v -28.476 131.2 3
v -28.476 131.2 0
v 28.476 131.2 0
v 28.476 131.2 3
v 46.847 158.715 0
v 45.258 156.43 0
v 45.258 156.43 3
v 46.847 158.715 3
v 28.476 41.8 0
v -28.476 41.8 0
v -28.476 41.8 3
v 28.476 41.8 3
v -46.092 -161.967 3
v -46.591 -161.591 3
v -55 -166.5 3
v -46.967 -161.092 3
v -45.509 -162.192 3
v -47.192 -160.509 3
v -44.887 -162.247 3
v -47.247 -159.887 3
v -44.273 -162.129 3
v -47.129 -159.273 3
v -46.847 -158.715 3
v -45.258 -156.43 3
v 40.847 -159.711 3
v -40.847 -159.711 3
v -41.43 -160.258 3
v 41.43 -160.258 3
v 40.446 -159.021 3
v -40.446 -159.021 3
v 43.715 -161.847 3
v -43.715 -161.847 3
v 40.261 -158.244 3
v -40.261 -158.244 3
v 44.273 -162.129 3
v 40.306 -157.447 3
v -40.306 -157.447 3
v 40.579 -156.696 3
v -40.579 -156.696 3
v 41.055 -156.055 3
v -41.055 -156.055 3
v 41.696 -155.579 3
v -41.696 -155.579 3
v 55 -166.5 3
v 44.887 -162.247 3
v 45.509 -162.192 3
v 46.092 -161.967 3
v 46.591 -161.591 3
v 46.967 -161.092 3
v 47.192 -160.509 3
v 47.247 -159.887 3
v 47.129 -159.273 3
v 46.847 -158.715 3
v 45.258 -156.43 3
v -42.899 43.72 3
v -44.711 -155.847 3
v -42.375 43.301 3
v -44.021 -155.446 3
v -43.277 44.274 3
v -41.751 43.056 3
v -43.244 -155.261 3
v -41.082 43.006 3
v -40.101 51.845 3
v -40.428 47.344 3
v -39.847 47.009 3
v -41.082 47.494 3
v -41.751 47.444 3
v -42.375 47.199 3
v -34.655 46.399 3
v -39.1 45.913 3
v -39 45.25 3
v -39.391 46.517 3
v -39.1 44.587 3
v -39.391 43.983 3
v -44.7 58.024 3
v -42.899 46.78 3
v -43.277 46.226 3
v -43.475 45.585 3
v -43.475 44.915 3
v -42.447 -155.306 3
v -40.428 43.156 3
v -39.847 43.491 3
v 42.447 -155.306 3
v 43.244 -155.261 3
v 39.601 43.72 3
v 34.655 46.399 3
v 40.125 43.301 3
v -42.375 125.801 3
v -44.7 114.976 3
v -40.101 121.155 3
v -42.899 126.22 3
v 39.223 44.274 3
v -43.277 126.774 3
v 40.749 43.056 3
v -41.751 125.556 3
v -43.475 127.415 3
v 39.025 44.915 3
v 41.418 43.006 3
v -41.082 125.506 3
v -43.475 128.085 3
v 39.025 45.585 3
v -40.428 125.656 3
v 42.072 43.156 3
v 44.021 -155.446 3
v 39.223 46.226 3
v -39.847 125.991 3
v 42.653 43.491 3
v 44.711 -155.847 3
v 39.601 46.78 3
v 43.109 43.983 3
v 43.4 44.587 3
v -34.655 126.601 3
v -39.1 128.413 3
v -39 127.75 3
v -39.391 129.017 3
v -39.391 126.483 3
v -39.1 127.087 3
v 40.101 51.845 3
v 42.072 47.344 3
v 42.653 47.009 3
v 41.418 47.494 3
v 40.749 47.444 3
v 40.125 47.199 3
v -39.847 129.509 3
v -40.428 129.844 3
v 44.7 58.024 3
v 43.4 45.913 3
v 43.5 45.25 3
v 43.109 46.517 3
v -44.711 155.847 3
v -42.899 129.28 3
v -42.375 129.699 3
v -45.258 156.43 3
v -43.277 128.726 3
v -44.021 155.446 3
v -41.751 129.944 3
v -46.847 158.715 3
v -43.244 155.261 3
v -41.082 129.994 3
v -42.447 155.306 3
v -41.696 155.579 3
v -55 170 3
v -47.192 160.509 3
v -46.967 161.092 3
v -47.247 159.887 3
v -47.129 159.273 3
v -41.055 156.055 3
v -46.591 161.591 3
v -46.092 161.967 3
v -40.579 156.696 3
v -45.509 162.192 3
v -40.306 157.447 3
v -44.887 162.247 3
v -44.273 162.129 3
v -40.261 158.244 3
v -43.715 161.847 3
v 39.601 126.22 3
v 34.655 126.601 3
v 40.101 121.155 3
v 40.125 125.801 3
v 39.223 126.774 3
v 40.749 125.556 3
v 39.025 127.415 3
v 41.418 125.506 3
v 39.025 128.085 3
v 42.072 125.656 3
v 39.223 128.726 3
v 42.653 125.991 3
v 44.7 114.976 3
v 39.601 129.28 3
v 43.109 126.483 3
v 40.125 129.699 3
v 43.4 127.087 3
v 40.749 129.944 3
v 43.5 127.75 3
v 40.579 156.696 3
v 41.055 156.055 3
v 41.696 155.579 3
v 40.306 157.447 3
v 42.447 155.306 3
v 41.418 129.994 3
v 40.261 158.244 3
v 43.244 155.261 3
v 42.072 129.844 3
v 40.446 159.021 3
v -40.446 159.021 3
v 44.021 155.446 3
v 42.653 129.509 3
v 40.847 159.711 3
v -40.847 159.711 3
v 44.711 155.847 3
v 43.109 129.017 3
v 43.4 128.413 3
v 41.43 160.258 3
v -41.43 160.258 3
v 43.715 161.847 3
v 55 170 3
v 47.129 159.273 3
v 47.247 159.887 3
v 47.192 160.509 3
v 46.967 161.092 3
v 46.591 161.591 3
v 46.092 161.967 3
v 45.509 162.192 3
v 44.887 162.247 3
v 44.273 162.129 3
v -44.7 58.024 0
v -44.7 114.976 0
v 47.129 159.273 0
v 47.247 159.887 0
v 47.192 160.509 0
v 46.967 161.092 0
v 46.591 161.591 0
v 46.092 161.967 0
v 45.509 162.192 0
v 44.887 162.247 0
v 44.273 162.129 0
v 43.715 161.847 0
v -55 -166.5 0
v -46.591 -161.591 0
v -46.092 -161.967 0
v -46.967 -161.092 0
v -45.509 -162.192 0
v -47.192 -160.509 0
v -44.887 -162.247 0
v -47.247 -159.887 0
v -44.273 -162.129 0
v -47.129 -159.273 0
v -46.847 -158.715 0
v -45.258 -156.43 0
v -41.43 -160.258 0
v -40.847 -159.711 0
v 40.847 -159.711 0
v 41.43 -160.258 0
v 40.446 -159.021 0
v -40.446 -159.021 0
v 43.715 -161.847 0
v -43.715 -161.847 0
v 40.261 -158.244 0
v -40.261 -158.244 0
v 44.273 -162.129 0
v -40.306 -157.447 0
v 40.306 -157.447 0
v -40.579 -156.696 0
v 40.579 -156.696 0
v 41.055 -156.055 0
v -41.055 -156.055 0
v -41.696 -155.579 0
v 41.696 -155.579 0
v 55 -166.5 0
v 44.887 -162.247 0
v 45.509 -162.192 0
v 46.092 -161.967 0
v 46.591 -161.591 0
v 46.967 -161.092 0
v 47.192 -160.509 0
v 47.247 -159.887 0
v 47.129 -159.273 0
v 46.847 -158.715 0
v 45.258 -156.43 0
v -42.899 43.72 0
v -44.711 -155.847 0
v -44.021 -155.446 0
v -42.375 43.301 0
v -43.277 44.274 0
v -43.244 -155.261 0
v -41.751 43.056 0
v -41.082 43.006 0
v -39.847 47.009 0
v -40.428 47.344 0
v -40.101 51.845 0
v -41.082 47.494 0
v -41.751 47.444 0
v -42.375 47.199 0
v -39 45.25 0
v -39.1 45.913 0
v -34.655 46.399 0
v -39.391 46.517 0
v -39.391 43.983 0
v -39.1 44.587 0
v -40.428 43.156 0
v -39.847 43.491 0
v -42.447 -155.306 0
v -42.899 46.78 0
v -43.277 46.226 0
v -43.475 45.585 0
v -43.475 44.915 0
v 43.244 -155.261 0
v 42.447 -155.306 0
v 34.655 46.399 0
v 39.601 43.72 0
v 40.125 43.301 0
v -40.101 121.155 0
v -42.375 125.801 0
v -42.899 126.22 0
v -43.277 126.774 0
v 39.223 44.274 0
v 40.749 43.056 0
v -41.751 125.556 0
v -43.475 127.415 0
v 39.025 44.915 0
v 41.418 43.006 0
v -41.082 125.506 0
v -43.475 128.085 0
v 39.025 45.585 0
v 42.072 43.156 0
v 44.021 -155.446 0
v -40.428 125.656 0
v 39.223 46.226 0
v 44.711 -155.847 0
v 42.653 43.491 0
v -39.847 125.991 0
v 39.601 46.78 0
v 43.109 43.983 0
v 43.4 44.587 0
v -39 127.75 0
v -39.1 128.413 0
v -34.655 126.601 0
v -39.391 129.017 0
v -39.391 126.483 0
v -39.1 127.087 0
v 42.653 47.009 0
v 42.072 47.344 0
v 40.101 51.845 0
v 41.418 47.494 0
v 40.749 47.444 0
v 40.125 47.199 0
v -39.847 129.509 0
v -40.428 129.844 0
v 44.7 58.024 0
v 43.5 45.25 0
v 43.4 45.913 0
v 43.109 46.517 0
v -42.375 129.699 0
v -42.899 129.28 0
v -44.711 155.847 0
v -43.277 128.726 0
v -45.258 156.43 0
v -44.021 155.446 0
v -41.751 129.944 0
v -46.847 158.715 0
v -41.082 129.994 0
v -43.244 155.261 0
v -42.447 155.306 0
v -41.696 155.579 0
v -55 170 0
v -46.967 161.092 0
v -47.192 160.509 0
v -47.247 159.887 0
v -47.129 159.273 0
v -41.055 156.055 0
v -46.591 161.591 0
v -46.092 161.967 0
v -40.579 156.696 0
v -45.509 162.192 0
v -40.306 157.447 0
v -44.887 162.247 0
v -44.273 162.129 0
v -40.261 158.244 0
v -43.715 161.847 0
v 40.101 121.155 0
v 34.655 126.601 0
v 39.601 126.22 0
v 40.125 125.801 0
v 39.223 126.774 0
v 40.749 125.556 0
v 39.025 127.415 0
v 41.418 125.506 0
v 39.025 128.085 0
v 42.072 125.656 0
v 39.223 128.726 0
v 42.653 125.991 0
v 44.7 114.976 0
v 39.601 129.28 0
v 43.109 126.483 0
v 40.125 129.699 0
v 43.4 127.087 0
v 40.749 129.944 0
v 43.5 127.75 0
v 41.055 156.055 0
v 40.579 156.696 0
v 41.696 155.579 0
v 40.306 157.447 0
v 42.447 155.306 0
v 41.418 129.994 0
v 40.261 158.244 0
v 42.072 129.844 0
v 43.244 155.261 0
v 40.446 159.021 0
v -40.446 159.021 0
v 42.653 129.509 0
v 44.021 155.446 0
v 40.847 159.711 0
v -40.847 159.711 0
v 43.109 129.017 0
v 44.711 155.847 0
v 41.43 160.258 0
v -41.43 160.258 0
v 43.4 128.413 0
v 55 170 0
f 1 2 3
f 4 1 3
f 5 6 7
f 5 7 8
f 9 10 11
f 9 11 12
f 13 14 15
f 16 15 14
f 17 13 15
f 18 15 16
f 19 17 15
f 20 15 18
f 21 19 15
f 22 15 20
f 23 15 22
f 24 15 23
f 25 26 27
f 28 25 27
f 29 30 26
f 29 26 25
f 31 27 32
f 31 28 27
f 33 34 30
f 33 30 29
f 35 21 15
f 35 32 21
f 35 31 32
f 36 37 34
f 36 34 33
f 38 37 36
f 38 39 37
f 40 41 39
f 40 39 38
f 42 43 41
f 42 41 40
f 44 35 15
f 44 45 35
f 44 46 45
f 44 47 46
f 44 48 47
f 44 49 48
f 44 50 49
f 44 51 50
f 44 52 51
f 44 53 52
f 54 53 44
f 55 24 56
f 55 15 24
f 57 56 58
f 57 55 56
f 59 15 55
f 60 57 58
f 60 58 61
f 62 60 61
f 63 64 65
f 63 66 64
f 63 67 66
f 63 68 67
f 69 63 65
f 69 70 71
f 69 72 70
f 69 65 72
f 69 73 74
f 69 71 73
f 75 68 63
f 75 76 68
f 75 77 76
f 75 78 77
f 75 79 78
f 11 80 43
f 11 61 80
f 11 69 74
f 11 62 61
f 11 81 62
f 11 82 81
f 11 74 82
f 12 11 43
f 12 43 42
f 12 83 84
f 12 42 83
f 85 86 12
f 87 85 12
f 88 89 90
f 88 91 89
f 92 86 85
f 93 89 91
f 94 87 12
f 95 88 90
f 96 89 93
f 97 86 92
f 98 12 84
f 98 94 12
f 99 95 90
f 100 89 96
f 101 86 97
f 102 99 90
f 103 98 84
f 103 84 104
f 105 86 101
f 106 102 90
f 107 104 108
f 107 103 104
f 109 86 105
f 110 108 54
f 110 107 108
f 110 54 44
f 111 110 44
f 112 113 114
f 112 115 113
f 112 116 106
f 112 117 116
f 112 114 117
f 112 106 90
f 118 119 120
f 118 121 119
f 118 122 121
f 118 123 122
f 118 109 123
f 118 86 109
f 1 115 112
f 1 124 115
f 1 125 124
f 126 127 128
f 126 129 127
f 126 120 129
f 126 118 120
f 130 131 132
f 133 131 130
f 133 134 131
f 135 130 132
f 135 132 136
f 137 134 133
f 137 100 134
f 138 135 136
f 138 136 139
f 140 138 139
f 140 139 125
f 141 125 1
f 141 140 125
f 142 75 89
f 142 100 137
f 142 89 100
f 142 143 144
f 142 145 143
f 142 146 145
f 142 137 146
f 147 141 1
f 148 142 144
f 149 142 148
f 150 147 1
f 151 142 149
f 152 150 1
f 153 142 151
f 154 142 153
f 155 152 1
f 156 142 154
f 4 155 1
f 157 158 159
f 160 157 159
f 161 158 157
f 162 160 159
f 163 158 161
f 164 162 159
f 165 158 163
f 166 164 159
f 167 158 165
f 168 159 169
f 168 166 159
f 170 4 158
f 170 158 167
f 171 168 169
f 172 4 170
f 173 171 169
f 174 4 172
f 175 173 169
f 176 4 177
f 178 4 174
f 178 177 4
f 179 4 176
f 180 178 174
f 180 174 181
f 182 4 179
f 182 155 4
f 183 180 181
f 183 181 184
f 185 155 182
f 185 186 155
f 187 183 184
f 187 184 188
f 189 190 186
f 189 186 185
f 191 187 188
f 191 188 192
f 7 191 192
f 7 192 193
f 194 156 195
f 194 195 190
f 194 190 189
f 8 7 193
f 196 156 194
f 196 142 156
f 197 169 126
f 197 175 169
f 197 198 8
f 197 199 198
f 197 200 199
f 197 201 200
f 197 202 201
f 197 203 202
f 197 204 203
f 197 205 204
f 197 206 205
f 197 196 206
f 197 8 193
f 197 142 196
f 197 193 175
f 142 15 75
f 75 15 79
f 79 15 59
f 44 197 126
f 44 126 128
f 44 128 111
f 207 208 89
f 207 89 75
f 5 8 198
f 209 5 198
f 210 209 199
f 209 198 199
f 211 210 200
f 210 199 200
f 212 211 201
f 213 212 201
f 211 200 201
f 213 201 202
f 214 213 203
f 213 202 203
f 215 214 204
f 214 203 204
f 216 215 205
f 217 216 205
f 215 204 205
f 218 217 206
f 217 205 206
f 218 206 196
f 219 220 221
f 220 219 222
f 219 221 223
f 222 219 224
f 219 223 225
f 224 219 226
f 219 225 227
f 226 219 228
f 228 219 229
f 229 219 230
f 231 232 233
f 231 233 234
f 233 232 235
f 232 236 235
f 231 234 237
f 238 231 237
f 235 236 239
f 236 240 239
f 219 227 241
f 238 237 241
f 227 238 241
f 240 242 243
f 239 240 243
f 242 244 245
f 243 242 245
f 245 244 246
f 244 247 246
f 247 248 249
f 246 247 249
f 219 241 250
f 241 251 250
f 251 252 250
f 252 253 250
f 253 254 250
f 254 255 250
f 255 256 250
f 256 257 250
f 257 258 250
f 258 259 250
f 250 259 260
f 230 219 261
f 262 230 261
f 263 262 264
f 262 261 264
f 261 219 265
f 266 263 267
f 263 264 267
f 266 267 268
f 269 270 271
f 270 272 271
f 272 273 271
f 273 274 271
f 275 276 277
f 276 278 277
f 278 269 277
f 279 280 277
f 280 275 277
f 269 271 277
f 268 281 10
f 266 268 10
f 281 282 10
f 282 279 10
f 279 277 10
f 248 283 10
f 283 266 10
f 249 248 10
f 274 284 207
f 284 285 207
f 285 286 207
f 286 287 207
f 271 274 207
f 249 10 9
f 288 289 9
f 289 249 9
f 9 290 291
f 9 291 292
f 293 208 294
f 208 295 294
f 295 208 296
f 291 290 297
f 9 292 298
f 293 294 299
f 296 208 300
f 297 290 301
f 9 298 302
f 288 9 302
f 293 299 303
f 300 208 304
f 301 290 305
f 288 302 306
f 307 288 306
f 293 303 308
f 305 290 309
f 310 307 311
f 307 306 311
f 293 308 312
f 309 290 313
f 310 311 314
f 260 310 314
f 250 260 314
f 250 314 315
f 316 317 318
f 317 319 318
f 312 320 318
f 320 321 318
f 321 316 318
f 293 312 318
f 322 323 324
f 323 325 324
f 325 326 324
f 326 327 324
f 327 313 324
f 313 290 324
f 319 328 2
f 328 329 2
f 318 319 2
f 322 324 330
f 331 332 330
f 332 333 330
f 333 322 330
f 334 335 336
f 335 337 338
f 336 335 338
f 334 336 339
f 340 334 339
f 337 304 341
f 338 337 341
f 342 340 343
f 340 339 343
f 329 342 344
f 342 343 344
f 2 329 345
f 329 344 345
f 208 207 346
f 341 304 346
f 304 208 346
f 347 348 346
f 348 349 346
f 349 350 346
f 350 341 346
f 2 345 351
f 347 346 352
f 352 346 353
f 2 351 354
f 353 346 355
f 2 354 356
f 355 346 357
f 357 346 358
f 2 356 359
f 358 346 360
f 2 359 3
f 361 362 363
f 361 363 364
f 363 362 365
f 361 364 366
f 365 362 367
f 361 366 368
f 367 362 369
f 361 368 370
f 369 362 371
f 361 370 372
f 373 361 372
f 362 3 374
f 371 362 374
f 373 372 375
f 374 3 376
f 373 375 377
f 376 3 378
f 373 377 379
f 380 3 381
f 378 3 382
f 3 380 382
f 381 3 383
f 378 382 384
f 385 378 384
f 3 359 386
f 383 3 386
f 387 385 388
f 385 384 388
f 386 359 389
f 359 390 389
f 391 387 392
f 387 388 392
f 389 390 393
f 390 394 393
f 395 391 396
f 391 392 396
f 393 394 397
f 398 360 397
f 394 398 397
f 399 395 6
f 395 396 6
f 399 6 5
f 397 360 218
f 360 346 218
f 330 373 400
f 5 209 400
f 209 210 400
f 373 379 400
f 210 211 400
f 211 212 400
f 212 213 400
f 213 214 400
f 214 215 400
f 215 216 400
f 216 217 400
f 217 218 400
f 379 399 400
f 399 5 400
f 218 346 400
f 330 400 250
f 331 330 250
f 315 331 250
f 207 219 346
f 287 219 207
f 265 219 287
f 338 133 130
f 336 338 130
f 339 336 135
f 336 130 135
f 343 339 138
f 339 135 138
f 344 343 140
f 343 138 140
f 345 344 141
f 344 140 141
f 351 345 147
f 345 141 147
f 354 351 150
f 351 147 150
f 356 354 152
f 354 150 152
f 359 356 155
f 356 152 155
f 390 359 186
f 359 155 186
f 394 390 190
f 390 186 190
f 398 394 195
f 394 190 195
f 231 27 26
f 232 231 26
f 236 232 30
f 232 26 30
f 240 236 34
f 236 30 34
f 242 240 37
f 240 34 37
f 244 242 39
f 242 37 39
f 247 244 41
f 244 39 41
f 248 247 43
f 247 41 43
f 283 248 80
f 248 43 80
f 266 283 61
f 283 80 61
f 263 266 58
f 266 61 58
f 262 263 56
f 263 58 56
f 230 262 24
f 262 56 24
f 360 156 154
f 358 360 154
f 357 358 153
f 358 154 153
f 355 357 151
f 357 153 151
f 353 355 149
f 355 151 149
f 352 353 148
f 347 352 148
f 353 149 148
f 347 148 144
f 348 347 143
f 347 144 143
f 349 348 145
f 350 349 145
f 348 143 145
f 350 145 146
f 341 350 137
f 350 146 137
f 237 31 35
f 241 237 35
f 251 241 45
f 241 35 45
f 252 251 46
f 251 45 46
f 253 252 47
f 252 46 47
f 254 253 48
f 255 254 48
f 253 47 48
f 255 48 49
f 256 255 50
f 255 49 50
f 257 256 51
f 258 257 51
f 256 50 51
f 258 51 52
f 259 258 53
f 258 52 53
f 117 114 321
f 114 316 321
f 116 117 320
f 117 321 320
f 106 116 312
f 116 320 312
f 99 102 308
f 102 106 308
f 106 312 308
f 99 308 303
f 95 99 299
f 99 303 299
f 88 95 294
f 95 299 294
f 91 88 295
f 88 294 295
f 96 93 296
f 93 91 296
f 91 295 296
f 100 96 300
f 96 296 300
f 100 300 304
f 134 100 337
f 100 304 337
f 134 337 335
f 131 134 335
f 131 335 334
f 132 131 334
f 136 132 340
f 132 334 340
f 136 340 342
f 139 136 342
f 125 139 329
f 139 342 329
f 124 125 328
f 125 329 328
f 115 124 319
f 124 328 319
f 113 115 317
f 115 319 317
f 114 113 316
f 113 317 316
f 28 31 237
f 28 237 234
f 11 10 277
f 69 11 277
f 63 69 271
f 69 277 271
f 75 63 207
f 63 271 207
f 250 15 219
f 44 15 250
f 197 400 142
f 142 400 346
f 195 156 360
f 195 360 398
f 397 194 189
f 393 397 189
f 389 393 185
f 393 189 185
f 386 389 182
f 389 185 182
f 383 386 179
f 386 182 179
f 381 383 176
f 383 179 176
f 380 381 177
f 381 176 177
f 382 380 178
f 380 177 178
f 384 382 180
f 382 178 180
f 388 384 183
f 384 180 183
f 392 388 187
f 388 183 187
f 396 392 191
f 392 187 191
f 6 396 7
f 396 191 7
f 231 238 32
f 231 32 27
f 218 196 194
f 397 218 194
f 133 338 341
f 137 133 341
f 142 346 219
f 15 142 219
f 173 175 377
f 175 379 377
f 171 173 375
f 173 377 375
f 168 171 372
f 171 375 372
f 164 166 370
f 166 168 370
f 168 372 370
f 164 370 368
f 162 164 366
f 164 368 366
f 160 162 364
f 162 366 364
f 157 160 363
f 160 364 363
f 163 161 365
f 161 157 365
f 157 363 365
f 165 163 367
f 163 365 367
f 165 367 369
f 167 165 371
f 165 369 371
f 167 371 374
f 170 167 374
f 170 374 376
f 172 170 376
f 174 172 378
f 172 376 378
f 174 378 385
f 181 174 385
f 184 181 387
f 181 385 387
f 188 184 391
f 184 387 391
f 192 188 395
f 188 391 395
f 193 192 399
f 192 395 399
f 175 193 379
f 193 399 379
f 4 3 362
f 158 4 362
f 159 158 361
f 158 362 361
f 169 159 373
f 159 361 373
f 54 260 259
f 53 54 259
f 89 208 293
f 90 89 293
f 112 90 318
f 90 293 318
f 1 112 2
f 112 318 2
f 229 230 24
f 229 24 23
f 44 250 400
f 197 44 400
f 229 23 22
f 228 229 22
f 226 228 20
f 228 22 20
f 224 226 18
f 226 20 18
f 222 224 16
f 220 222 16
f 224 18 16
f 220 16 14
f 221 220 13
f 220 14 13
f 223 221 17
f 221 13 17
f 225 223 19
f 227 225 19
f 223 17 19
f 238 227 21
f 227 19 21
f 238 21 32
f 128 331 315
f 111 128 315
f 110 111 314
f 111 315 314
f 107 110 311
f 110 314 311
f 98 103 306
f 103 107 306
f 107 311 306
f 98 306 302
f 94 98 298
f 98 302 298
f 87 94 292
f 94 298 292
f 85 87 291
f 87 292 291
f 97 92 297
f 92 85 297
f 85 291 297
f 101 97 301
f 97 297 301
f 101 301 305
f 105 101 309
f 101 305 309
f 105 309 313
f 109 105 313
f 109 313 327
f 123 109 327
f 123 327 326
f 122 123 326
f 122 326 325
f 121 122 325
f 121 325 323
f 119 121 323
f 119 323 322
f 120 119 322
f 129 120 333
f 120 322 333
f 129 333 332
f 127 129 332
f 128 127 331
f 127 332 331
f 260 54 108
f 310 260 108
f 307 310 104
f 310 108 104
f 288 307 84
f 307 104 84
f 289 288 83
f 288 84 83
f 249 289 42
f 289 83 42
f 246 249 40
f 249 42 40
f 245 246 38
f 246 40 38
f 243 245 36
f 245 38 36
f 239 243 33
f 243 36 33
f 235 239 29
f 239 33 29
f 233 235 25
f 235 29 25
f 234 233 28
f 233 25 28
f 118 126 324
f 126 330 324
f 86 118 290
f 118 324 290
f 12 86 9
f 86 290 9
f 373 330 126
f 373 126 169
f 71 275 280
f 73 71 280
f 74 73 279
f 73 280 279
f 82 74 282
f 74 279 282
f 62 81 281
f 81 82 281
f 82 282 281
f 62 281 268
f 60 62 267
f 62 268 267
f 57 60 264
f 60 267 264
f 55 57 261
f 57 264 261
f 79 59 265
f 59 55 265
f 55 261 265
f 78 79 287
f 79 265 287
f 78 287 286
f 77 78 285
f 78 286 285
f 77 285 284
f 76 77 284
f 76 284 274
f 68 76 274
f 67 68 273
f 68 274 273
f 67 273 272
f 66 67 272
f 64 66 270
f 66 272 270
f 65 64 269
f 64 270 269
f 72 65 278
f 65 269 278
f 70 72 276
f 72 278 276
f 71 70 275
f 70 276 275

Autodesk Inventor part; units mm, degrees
ref_plane "YZ Plane" through (0, 0, 0) normal (1, 0, 0) x (0, 1, 0)
ref_plane "XZ Plane" through (0, 0, 0) normal (0, 1, 0) x (-1, 0, 0)
ref_plane "XY Plane" through (0, 0, 0) normal (0, 0, 1) x (1, 0, 0)
sketch "スケッチ1" plane through (0, 0, 0) normal (0, 0, 1) x (1, 0, 0)
  line L0 (-55, -170) -> (55, -170)
  line L1 (55, -170) -> (55, 170)
  line L2 (55, 170) -> (-55, 170)
  line L3 (-55, 170) -> (-55, -170)
  line L4 (-55, -170) -> (55, 170) construction
  line L5 (55, -170) -> (-55, 170) construction
  line L6 (-55, 140) -> (-50, 140) construction
  line L7 (-50, 140) -> (-25, 165) construction
  line L8 (-25, 165) -> (-25, 170) construction
  line L9 (-46, 40.5) -> (46, 40.5) construction
  line L10 (46, 40.5) -> (46, 132.5) construction
  line L11 (46, 132.5) -> (-46, 132.5) construction
  line L12 (-46, 132.5) -> (-46, 40.5) construction
  line L13 (-46, 40.5) -> (46, 132.5) construction
  line L14 (46, 40.5) -> (-46, 132.5) construction
  line L15 (-46, 1.5) -> (46, 1.5) construction
  line L16 (46, 1.5) -> (46, 37.5) construction
  line L17 (46, 37.5) -> (-46, 37.5) construction
  line L18 (-46, 37.5) -> (-46, 1.5) construction
  line L19 (-46, 1.5) -> (46, 37.5) construction
  line L20 (46, 1.5) -> (-46, 37.5) construction
  line L21 (0, 0) -> (0, 86.5) construction
  circle A0 centre (0, 86.5) radius 53 construction
  line L22 (-44.7, 41.8) -> (44.7, 41.8) construction
  line L23 (44.7, 41.8) -> (44.7, 131.2) construction
  line L24 (44.7, 131.2) -> (-44.7, 131.2) construction
  line L25 (-44.7, 131.2) -> (-44.7, 41.8) construction
  line L26 (-44.7, 41.8) -> (44.7, 131.2) construction
  line L27 (44.7, 41.8) -> (-44.7, 131.2) construction
  arc A1 (-28.4765, 131.2) -> (-44.7, 114.9765) centre (0, 86.5) ccw
  arc A2 (-44.7, 58.0235) -> (-28.4765, 41.8) centre (0, 86.5) ccw
  arc A3 (28.4765, 41.8) -> (44.7, 58.0235) centre (0, 86.5) ccw
  arc A4 (44.7, 114.9765) -> (28.4765, 131.2) centre (0, 86.5) ccw
  line L28 (-28.4765, 131.2) -> (28.4765, 131.2)
  line L29 (-44.7, 114.9765) -> (-44.7, 58.0235)
  line L30 (-28.4765, 41.8) -> (28.4765, 41.8)
  line L31 (44.7, 58.0235) -> (44.7, 114.9765)
  line L32 (-41.25, 45.25) -> (41.25, 45.25) construction
  line L33 (41.25, 45.25) -> (41.25, 127.75) construction
  line L34 (41.25, 127.75) -> (-41.25, 127.75) construction
  line L35 (-41.25, 127.75) -> (-41.25, 45.25) construction
  line L36 (-41.25, 45.25) -> (41.25, 127.75) construction
  line L37 (41.25, 45.25) -> (-41.25, 127.75) construction
  circle A5 centre (-41.25, 127.75) radius 2.25
  circle A6 centre (-41.25, 45.25) radius 2.25
  circle A7 centre (41.25, 45.25) radius 2.25
  circle A8 centre (41.25, 127.75) radius 2.25
  circle A9 centre (-45, 160) radius 2.25
  circle A10 centre (45, 160) radius 2.25
  circle A11 centre (45, -160) radius 2.25
  circle A12 centre (-45, -160) radius 2.25
  circle A13 centre (-45, 0) radius 2.25 construction
  circle A14 centre (45, 0) radius 2.25 construction
  line L38 (-55, 0) -> (55, 0) construction
  circle A15 centre (-41.25, -49.75) radius 2.25
  arc A16 (-44.7, -36.9765) -> (-28.4765, -53.2) centre (0, -8.5) ccw
  line L39 (-28.4765, -53.2) -> (28.4765, -53.2)
  arc A17 (28.4765, -53.2) -> (44.7, -36.9765) centre (0, -8.5) ccw
  circle A18 centre (41.25, -49.75) radius 2.25
  line L40 (44.7, -36.9765) -> (44.7, 19.9765)
  circle A19 centre (41.25, 32.75) radius 2.25
  arc A20 (44.7, 19.9765) -> (28.4765, 36.2) centre (0, -8.5) ccw
  line L41 (-28.4765, 36.2) -> (28.4765, 36.2)
  circle A21 centre (-41.25, 32.75) radius 2.25
  arc A22 (-28.4765, 36.2) -> (-44.7, 19.9765) centre (0, -8.5) ccw
  line L42 (-44.7, 19.9765) -> (-44.7, -36.9765)
  circle A23 centre (-41.25, -144.75) radius 2.25
  arc A24 (-44.7, -131.9765) -> (-28.4765, -148.2) centre (0, -103.5) ccw
  line L43 (-28.4765, -148.2) -> (28.4765, -148.2)
  arc A25 (28.4765, -148.2) -> (44.7, -131.9765) centre (0, -103.5) ccw
  circle A26 centre (41.25, -144.75) radius 2.25
  line L44 (44.7, -131.9765) -> (44.7, -75.0235)
  circle A27 centre (41.25, -62.25) radius 2.25
  arc A28 (44.7, -75.0235) -> (28.4765, -58.8) centre (0, -103.5) ccw
  line L45 (-28.4765, -58.8) -> (28.4765, -58.8)
  circle A29 centre (-41.25, -62.25) radius 2.25
  arc A30 (-28.4765, -58.8) -> (-44.7, -75.0235) centre (0, -103.5) ccw
  line L46 (-44.7, -75.0235) -> (-44.7, -131.9765)
  point P0 (0, 19.5)
  point P1 (0, 19.5)
  dimension "d12" = 106
  dimension "d0" = 110
  dimension "d1" = 340
  dimension "d2" = 135
  dimension "d3" = 30
  dimension "d4" = 30
  dimension "d5" = 5
  dimension "d6" = 92
  dimension "d7" = 92
  dimension "d8" = 92
  dimension "d9" = 36
  dimension "d10" = 3
  dimension "d11" = 1.5
  dimension "d13" = 89.4
  dimension "d14" = 89.4
  dimension "d15" = 82.5
  dimension "d16" = 82.5
  dimension "d17" = 4.5
  dimension "d25" = 4.5
  dimension "d26" = 10
  dimension "d27" = 10
  dimension "d28" = 10
  dimension "d29" = 10
  dimension "d30" = 10
  dimension "d31" = 10
  dimension "d32" = 10
  dimension "d33" = 10
  dimension "d34" = 10
  dimension "d35" = 10
  dimension "d45" = 95
extrude "押し出し1" add sketch "スケッチ1" along normal blind 3 contours L3 L2 L1 L0 | A15 | L42 A22 L41 A20 L40 A17 L39 A16 | A18 | A19 | A21 | A23 | L46 A30 L45 A28 L44 A25 L43 A24 | A26 | A27 | A29
sketch "スケッチ2" plane through (0, 0, 3) normal (0, 0, 1) x (1, 0, 0)
  circle A0 centre (-45, 160) radius 2.25 construction
  circle A1 centre (45, -160) radius 2.25 construction
  circle A2 centre (-45, -160) radius 2.25 construction
  circle A3 centre (-43, 158) radius 2.75 construction
  line L0 (55, 170) -> (-55, 170) projected
  line L1 (-55, 170) -> (-55, -170) projected
  line L2 (-43.7153, 161.8472) -> (-41.4298, 160.2577)
  line L3 (-45.2577, 156.4298) -> (-46.8472, 158.7153)
  circle A4 centre (-45, 160) radius 2.25 construction
  arc A5 (-43.7153, 161.8472) -> (-46.8472, 158.7153) centre (-45, 160) ccw
  arc A6 (-45.2577, 156.4298) -> (-41.4298, 160.2577) centre (-43, 158) ccw
  line L4 (55, 170) -> (-55, 170) construction
  line L5 (0, 170) -> (0, -170) construction
  line L6 (-55, -170) -> (55, -170) construction
  line L7 (-55, 0) -> (55, 0) construction
  line L8 (55, -170) -> (55, 170) construction
  circle A7 centre (45, 160) radius 2.25 construction
  circle A8 centre (43, 158) radius 2.75 construction
  line L9 (43.7153, 161.8472) -> (41.4298, 160.2577)
  line L10 (45.2577, 156.4298) -> (46.8472, 158.7153)
  circle A9 centre (45, 160) radius 2.25 construction
  arc A10 (46.8472, 158.7153) -> (43.7153, 161.8472) centre (45, 160) ccw
  arc A11 (41.4298, 160.2577) -> (45.2577, 156.4298) centre (43, 158) ccw
  circle A12 centre (-45, -160) radius 2.25 construction
  circle A13 centre (-43, -158) radius 2.75 construction
  line L11 (-43.7153, -161.8472) -> (-41.4298, -160.2577)
  line L12 (-45.2577, -156.4298) -> (-46.8472, -158.7153)
  circle A14 centre (-45, -160) radius 2.25 construction
  arc A15 (-46.8472, -158.7153) -> (-43.7153, -161.8472) centre (-45, -160) ccw
  arc A16 (-41.4298, -160.2577) -> (-45.2577, -156.4298) centre (-43, -158) ccw
  circle A17 centre (45, -160) radius 2.25 construction
  line L13 (45.2577, -156.4298) -> (46.8472, -158.7153)
  arc A18 (45.2577, -156.4298) -> (41.4298, -160.2577) centre (43, -158) ccw
  circle A19 centre (43, -158) radius 2.75 construction
  line L14 (43.7153, -161.8472) -> (41.4298, -160.2577)
  circle A20 centre (45, -160) radius 2.25 construction
  arc A21 (43.7153, -161.8472) -> (46.8472, -158.7153) centre (45, -160) ccw
  point P0 (0, 0)
  dimension "d38" = 5.5
  dimension "d39" = 12
  dimension "d40" = 12
extrude "押し出し2" cut sketch "スケッチ2" against normal through all
sketch "スケッチ3" plane through (0, 0, 3) normal (0, 0, 1) x (1, 0, 0)
  line L0 (-55, -170) -> (55, -170) construction
  line L1 (-55, -166.5) -> (55, -166.5)
  line L2 (55, -166.5) -> (55, -170)
  line L3 (55, -170) -> (-55, -170)
  line L4 (-55, -170) -> (-55, -166.5)
  line L5 (-55, -166.5) -> (55, -170) construction
  line L6 (55, -166.5) -> (-55, -170) construction
  line L7 (0, -168.25) -> (0, -170) construction
  point P0 (0, 0)
  dimension "d50" = 3.5
  dimension "d51" = 110
extrude "押し出し3" cut sketch "スケッチ3" against normal through all
equation "\"d4\" = d3"
equation "\"d11\" = 0.5 * d10"
equation "\"d27\" = d26"
equation "\"d28\" = d26"
equation "\"d29\" = d26"
equation "\"d30\" = d26"
equation "\"d31\" = d26"
equation "\"d32\" = d26"
equation "\"d33\" = d26"
equation "\"d34\" = d26"
equation "\"d35\" = d26"
equation "\"d45\" = d7 + d10"
properties part number "bottom_panel" material "アルミニウム 6061"
